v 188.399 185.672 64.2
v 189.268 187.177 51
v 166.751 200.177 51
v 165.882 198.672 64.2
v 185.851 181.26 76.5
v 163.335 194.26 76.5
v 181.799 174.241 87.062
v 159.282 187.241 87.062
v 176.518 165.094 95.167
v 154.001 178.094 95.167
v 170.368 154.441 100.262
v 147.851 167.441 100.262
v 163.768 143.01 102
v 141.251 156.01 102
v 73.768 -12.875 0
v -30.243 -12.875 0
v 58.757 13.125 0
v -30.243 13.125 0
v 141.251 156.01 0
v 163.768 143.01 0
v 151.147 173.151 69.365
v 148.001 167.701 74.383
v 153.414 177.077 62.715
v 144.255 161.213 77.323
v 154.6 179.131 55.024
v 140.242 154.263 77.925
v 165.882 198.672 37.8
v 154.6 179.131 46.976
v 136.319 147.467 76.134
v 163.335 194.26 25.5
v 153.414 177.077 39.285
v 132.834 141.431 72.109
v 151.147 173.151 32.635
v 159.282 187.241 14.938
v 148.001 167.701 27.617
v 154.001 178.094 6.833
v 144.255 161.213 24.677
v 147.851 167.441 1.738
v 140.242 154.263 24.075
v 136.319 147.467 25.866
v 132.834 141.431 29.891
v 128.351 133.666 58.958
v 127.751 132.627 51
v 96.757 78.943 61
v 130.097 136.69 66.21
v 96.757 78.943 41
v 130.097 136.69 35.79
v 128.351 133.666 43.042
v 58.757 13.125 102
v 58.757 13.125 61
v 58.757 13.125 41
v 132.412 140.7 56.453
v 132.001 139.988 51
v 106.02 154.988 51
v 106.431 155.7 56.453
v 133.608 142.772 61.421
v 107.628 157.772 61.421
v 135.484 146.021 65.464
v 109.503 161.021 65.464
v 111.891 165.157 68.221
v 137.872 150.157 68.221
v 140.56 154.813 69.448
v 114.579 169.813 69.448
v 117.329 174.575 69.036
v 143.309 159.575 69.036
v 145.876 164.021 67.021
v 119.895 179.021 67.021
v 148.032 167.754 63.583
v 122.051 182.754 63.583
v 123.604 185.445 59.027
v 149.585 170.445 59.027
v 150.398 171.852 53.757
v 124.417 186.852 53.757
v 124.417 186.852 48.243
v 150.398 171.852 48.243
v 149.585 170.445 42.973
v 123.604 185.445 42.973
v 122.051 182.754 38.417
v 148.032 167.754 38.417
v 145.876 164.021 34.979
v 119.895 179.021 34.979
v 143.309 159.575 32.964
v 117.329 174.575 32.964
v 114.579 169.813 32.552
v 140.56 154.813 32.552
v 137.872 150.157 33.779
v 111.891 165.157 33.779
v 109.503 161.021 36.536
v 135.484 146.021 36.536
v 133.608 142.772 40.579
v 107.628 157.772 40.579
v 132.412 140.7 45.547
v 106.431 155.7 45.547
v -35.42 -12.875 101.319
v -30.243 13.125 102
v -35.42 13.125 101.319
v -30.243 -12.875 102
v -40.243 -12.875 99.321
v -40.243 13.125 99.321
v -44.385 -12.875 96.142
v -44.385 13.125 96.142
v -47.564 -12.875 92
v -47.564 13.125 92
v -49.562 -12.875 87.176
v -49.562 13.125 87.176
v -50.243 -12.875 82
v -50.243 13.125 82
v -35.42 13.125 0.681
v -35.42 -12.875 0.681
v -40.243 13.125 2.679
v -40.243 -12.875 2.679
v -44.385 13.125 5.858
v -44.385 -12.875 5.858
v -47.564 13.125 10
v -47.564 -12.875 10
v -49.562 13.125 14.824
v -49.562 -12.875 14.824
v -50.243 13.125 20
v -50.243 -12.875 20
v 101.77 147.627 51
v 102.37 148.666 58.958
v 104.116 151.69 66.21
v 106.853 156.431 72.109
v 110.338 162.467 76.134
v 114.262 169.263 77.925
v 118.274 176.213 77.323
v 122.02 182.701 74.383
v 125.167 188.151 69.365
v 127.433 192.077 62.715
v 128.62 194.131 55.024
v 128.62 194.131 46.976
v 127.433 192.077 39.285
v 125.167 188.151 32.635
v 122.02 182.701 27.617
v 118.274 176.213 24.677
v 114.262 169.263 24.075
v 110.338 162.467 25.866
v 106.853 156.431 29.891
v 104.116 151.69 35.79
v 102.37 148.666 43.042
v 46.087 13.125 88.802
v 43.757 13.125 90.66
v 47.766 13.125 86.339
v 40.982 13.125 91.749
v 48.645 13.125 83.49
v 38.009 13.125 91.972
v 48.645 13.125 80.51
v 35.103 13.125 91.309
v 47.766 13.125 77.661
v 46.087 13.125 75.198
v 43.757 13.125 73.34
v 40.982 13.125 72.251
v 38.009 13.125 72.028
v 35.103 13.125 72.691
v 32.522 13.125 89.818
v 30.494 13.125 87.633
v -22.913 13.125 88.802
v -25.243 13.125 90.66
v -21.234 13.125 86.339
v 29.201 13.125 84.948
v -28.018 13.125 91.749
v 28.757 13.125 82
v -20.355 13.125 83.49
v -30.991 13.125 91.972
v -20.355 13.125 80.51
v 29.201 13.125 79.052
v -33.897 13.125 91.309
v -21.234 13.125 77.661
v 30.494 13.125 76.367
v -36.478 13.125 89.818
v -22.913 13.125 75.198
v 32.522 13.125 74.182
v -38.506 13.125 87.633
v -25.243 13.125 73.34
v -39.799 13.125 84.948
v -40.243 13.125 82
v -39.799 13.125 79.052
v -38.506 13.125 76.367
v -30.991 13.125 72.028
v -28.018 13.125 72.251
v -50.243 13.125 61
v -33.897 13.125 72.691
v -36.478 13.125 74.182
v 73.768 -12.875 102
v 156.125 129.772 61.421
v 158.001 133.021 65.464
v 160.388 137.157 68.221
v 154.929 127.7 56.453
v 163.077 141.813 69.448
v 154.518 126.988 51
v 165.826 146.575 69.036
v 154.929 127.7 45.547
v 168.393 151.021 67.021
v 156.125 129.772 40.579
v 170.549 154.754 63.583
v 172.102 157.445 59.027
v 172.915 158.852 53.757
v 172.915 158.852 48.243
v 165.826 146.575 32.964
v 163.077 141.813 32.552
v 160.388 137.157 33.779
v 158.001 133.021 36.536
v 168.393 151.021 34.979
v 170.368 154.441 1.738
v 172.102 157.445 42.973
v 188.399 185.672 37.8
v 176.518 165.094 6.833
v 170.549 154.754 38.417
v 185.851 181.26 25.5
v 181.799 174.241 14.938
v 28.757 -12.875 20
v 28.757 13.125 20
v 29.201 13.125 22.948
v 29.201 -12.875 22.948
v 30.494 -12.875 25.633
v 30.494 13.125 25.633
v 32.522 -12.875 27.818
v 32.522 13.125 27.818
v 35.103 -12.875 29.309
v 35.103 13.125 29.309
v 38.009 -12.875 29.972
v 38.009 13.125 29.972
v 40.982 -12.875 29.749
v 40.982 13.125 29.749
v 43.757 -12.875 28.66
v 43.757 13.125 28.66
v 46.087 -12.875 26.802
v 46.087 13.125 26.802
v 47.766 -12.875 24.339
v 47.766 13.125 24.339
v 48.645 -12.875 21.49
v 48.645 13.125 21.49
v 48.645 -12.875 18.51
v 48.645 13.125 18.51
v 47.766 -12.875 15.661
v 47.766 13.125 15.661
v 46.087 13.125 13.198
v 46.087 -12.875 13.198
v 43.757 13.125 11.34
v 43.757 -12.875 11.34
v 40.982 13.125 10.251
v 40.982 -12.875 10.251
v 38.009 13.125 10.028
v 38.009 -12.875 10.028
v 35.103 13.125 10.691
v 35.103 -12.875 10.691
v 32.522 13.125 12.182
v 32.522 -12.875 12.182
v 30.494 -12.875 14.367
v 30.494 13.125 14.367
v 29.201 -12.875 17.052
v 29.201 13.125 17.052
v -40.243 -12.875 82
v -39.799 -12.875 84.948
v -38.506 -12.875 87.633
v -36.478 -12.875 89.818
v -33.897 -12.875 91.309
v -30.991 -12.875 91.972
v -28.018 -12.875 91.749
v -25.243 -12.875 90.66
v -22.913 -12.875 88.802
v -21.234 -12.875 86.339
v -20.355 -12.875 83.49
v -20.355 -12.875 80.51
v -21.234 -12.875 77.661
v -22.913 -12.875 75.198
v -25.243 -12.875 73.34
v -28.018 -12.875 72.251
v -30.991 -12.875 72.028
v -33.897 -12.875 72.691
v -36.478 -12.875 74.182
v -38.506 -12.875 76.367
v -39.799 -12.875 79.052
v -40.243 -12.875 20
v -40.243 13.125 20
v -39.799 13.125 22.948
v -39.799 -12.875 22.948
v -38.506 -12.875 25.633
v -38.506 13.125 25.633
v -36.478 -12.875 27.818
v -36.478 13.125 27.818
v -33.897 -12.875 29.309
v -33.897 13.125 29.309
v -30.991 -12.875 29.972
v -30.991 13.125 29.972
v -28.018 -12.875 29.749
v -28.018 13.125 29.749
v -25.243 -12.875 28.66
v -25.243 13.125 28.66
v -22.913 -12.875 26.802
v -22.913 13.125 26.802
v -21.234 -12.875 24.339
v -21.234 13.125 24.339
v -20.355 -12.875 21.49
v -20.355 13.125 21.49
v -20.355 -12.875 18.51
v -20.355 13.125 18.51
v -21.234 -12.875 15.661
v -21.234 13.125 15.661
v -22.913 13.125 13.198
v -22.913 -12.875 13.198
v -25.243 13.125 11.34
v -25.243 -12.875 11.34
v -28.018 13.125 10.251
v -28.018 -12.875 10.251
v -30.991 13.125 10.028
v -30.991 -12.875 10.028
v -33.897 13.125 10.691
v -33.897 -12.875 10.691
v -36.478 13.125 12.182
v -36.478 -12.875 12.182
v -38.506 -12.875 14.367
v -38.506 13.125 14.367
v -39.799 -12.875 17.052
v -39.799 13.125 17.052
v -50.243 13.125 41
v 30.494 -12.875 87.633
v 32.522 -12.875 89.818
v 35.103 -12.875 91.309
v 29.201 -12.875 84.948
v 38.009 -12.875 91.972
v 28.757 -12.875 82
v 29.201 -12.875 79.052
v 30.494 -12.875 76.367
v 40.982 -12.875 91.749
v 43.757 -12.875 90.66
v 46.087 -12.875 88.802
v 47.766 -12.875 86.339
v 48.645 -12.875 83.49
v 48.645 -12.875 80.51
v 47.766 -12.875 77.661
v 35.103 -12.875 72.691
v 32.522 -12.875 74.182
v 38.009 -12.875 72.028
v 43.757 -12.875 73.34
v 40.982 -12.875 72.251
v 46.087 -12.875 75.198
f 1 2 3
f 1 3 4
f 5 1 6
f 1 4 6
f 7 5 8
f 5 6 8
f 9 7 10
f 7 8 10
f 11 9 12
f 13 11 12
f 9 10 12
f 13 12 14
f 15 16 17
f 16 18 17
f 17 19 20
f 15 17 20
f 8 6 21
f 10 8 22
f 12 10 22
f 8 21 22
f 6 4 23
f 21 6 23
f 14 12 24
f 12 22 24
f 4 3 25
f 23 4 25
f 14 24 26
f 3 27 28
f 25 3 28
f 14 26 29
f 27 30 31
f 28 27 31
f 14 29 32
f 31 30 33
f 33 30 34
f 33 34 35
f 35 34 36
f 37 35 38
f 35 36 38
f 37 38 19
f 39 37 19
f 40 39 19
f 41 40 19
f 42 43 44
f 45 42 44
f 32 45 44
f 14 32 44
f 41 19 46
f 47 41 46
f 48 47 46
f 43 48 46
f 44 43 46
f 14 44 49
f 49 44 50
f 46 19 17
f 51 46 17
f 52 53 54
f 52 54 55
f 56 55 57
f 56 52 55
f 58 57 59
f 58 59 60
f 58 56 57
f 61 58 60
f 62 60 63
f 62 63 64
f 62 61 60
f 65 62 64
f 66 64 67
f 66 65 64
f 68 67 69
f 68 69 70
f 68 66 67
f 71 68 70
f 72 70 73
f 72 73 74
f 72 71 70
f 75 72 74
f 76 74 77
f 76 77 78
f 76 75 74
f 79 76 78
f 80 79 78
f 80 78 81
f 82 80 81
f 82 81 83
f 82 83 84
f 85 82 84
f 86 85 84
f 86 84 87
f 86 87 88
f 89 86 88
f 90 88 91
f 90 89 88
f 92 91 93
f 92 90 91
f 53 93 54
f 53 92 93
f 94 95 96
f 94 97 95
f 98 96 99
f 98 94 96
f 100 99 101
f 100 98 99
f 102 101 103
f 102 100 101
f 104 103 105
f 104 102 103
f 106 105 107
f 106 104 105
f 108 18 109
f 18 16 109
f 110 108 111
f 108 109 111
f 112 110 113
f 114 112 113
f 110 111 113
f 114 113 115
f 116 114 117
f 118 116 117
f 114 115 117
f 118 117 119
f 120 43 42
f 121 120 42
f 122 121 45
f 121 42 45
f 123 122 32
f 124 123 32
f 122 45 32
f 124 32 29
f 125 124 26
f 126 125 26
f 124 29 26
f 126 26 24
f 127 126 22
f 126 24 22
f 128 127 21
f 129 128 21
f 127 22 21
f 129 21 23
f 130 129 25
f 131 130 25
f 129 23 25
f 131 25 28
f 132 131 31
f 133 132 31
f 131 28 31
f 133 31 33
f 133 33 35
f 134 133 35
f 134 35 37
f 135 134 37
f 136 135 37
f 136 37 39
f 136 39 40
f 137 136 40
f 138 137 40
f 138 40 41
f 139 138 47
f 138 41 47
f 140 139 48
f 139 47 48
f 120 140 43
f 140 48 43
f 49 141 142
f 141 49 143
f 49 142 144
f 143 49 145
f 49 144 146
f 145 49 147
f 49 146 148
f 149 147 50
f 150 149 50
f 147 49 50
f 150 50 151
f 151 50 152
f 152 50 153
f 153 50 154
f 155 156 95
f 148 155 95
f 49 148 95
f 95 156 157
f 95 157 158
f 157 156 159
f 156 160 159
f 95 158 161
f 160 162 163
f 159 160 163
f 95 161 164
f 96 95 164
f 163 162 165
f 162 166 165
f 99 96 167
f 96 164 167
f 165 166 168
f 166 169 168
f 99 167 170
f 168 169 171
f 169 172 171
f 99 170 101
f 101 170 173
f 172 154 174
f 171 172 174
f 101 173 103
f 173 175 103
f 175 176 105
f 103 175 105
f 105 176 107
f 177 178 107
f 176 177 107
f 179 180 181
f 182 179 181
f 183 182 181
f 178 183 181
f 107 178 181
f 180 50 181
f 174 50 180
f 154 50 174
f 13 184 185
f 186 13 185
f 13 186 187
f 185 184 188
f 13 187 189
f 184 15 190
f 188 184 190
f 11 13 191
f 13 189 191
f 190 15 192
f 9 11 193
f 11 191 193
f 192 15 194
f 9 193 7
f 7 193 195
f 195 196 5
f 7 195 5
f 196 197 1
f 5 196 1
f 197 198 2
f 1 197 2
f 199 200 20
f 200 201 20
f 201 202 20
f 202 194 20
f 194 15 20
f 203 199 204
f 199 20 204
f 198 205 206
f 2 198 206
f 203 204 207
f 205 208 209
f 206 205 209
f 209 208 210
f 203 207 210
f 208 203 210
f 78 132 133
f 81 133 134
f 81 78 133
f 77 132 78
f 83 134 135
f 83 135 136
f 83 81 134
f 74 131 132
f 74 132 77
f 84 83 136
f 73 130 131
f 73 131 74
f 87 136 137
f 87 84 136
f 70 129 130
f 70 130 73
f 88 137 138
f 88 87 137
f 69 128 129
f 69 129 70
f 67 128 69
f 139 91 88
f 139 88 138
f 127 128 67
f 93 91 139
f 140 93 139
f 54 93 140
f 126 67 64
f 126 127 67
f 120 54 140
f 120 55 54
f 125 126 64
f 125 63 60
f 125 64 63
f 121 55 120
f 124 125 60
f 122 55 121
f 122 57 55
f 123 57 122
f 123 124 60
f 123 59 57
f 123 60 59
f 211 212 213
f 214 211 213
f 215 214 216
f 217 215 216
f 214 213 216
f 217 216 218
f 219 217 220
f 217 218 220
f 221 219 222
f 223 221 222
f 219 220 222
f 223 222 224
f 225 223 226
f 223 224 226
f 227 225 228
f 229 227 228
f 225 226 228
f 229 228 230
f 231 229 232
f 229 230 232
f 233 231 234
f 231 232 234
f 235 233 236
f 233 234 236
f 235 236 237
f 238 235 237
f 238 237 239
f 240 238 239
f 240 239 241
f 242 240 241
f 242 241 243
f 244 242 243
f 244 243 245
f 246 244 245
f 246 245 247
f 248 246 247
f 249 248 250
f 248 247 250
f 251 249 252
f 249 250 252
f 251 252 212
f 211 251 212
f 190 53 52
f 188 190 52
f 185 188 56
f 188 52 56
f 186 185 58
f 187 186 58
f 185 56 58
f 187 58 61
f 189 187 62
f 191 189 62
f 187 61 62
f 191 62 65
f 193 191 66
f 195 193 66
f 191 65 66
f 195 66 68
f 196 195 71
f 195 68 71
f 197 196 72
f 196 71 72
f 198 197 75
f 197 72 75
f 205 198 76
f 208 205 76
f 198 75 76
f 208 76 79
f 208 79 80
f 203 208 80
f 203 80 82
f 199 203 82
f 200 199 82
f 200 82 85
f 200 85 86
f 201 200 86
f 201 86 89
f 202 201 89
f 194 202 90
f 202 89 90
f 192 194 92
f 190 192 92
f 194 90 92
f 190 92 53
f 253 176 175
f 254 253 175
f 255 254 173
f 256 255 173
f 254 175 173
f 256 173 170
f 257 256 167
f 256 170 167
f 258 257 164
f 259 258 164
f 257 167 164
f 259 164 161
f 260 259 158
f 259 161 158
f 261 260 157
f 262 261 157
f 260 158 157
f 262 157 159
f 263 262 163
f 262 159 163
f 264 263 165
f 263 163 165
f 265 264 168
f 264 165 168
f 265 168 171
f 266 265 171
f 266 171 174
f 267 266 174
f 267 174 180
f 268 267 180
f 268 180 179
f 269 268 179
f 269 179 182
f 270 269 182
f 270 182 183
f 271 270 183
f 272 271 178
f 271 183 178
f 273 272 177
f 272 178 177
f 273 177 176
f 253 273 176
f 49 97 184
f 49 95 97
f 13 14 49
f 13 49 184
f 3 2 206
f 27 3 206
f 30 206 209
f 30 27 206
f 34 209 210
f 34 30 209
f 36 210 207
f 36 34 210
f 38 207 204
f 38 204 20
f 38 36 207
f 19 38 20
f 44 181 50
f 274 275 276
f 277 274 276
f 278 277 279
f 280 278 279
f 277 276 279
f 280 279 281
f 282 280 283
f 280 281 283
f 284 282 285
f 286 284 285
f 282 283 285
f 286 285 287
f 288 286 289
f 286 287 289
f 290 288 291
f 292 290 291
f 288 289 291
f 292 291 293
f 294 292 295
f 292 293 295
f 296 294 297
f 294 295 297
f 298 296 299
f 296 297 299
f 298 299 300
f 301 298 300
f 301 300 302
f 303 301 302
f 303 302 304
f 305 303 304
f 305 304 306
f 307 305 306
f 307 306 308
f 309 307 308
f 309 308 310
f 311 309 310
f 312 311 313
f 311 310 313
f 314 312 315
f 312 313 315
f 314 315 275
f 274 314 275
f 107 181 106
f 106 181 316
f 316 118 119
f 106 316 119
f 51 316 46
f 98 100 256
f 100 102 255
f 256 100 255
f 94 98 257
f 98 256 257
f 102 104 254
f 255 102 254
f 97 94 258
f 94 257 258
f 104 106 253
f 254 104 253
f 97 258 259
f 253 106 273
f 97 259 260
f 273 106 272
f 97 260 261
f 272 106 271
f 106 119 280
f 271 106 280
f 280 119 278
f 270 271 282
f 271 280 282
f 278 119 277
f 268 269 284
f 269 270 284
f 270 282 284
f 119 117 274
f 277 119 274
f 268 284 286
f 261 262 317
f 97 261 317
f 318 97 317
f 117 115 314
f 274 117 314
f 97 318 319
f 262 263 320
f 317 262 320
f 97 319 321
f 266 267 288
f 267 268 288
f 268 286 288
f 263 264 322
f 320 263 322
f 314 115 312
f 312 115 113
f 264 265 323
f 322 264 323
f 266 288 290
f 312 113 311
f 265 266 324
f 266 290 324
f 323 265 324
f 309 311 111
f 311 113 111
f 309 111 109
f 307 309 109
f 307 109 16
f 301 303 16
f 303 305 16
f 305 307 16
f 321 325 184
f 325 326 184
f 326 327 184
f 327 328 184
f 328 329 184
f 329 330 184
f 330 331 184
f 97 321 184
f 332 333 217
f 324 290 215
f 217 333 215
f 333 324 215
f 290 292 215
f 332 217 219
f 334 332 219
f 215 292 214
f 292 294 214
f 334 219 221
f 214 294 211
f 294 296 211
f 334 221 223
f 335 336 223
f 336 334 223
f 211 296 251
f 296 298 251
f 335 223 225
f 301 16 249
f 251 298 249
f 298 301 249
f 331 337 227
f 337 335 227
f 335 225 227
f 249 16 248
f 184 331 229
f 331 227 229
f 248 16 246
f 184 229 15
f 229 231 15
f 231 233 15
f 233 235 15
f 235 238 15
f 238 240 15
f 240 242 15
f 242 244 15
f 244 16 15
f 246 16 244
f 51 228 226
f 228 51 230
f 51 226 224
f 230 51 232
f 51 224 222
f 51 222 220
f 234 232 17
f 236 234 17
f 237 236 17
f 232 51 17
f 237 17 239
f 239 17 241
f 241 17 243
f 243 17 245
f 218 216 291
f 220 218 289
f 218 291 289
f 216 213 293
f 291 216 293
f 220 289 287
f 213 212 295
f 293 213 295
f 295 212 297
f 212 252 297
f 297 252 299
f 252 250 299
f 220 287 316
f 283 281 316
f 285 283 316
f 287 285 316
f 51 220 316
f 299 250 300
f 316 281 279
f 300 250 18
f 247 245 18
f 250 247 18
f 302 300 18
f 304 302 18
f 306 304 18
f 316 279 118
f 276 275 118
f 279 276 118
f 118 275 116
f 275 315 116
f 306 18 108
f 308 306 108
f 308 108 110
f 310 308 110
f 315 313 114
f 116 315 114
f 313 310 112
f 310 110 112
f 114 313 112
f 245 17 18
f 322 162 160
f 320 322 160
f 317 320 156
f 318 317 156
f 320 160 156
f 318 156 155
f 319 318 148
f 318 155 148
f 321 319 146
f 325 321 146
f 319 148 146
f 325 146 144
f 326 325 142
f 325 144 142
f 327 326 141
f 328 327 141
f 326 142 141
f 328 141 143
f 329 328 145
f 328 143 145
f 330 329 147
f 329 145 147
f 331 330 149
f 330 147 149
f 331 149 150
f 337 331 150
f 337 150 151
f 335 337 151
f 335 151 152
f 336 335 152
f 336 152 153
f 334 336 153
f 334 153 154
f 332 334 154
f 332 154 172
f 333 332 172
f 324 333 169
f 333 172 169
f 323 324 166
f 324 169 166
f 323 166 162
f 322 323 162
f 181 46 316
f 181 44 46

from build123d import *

# Parameters (mm, degrees)
F1_DEPTH  = 102
F2_R      = 50.99999
F3_R      = 27
F3_R_2    = 18.5
F4_DEPTH  = 30
F7_DEPTH  = 10
F8_R      = 18.5
F9_DEPTH  = 26
F10_R     = 20
F11_R     = 10
F12_DEPTH = 26


# Not quite as in the source:
# - a fillet or chamfer is up to 0.001 mm smaller than in the source, because OpenCascade refuses the exact size


with BuildPart() as f1:
    # F0 (on Top) → F1 (new body)
    with BuildSketch(Plane.XY):
        Polygon((-50.2432771027, 13.1253414819), (-50.2432771027, -12.8746585181), (73.7678298962, -12.8746585181), (189.2678298962, 187.1772097561), (166.7511693978, 200.1772097561), (58.7567228973, 13.1253414819), align=None)
    extrude(amount=F1_DEPTH)

    # F2 (radius 51 in the source; OpenCascade refuses exactly that, so slightly less here)
    f2_edges = [f1.edges().sort_by_distance(p)[0] for p in [
        (178.0095, 193.67721, 0),
        (178.0095, 193.67721, 102),
    ]]
    fillet(f2_edges, radius=F2_R)

    # F3 (on face) → F4 (join)
    with BuildSketch(Plane(origin=(38.3841025946, -22.1610719656, 0), x_dir=(-0.5, -0.8660254038, 0), z_dir=(-0.8660254038, 0.5, 0))):
        with Locations((-205.7341336064, 51)):
            Circle(F3_R)
        with Locations((-205.7341336064, 51)):
            Circle(F3_R_2, mode=Mode.SUBTRACT)
    extrude(amount=F4_DEPTH)

    # F6 (on offset) → F7 (join, symmetric)
    with BuildSketch(Plane.XY.offset(51)):
        Polygon((96.7567228973, 78.9432721695), (-50.2432771027, 13.1253414819), (58.7567228973, 13.1253414819), align=None)
    extrude(amount=F7_DEPTH, both=True)

    # F8 (on face) → F9 (cut)
    with BuildSketch(Plane(origin=(38.3841025946, -22.1610719656, 0), x_dir=(-0.5, -0.8660254038, 0), z_dir=(-0.8660254038, 0.5, 0))):
        with Locations((-205.7341336064, 51)):
            Circle(F8_R)
    extrude(amount=-F9_DEPTH, mode=Mode.SUBTRACT)

    # F10
    f10_edges = [f1.edges().sort_by_distance(p)[0] for p in [
        (-50.243277, 0.125341, 0),
        (-50.243277, 0.125341, 102),
    ]]
    fillet(f10_edges, radius=F10_R)

    # F11 (on face) → F12 (cut)
    with BuildSketch(Plane(origin=(0, 13.1253414819, 0), x_dir=(-1, 0, 0), z_dir=(0, 1, 0))):
        with Locations((30.2432771027, 20)):
            Circle(F11_R)
        with Locations((30.2432771027, 82)):
            Circle(F11_R)
        with Locations((-38.7567228973, 20)):
            Circle(F11_R)
        with Locations((-38.7567228973, 82)):
            Circle(F11_R)
    extrude(amount=-F12_DEPTH, mode=Mode.SUBTRACT)


solid = f1.part
